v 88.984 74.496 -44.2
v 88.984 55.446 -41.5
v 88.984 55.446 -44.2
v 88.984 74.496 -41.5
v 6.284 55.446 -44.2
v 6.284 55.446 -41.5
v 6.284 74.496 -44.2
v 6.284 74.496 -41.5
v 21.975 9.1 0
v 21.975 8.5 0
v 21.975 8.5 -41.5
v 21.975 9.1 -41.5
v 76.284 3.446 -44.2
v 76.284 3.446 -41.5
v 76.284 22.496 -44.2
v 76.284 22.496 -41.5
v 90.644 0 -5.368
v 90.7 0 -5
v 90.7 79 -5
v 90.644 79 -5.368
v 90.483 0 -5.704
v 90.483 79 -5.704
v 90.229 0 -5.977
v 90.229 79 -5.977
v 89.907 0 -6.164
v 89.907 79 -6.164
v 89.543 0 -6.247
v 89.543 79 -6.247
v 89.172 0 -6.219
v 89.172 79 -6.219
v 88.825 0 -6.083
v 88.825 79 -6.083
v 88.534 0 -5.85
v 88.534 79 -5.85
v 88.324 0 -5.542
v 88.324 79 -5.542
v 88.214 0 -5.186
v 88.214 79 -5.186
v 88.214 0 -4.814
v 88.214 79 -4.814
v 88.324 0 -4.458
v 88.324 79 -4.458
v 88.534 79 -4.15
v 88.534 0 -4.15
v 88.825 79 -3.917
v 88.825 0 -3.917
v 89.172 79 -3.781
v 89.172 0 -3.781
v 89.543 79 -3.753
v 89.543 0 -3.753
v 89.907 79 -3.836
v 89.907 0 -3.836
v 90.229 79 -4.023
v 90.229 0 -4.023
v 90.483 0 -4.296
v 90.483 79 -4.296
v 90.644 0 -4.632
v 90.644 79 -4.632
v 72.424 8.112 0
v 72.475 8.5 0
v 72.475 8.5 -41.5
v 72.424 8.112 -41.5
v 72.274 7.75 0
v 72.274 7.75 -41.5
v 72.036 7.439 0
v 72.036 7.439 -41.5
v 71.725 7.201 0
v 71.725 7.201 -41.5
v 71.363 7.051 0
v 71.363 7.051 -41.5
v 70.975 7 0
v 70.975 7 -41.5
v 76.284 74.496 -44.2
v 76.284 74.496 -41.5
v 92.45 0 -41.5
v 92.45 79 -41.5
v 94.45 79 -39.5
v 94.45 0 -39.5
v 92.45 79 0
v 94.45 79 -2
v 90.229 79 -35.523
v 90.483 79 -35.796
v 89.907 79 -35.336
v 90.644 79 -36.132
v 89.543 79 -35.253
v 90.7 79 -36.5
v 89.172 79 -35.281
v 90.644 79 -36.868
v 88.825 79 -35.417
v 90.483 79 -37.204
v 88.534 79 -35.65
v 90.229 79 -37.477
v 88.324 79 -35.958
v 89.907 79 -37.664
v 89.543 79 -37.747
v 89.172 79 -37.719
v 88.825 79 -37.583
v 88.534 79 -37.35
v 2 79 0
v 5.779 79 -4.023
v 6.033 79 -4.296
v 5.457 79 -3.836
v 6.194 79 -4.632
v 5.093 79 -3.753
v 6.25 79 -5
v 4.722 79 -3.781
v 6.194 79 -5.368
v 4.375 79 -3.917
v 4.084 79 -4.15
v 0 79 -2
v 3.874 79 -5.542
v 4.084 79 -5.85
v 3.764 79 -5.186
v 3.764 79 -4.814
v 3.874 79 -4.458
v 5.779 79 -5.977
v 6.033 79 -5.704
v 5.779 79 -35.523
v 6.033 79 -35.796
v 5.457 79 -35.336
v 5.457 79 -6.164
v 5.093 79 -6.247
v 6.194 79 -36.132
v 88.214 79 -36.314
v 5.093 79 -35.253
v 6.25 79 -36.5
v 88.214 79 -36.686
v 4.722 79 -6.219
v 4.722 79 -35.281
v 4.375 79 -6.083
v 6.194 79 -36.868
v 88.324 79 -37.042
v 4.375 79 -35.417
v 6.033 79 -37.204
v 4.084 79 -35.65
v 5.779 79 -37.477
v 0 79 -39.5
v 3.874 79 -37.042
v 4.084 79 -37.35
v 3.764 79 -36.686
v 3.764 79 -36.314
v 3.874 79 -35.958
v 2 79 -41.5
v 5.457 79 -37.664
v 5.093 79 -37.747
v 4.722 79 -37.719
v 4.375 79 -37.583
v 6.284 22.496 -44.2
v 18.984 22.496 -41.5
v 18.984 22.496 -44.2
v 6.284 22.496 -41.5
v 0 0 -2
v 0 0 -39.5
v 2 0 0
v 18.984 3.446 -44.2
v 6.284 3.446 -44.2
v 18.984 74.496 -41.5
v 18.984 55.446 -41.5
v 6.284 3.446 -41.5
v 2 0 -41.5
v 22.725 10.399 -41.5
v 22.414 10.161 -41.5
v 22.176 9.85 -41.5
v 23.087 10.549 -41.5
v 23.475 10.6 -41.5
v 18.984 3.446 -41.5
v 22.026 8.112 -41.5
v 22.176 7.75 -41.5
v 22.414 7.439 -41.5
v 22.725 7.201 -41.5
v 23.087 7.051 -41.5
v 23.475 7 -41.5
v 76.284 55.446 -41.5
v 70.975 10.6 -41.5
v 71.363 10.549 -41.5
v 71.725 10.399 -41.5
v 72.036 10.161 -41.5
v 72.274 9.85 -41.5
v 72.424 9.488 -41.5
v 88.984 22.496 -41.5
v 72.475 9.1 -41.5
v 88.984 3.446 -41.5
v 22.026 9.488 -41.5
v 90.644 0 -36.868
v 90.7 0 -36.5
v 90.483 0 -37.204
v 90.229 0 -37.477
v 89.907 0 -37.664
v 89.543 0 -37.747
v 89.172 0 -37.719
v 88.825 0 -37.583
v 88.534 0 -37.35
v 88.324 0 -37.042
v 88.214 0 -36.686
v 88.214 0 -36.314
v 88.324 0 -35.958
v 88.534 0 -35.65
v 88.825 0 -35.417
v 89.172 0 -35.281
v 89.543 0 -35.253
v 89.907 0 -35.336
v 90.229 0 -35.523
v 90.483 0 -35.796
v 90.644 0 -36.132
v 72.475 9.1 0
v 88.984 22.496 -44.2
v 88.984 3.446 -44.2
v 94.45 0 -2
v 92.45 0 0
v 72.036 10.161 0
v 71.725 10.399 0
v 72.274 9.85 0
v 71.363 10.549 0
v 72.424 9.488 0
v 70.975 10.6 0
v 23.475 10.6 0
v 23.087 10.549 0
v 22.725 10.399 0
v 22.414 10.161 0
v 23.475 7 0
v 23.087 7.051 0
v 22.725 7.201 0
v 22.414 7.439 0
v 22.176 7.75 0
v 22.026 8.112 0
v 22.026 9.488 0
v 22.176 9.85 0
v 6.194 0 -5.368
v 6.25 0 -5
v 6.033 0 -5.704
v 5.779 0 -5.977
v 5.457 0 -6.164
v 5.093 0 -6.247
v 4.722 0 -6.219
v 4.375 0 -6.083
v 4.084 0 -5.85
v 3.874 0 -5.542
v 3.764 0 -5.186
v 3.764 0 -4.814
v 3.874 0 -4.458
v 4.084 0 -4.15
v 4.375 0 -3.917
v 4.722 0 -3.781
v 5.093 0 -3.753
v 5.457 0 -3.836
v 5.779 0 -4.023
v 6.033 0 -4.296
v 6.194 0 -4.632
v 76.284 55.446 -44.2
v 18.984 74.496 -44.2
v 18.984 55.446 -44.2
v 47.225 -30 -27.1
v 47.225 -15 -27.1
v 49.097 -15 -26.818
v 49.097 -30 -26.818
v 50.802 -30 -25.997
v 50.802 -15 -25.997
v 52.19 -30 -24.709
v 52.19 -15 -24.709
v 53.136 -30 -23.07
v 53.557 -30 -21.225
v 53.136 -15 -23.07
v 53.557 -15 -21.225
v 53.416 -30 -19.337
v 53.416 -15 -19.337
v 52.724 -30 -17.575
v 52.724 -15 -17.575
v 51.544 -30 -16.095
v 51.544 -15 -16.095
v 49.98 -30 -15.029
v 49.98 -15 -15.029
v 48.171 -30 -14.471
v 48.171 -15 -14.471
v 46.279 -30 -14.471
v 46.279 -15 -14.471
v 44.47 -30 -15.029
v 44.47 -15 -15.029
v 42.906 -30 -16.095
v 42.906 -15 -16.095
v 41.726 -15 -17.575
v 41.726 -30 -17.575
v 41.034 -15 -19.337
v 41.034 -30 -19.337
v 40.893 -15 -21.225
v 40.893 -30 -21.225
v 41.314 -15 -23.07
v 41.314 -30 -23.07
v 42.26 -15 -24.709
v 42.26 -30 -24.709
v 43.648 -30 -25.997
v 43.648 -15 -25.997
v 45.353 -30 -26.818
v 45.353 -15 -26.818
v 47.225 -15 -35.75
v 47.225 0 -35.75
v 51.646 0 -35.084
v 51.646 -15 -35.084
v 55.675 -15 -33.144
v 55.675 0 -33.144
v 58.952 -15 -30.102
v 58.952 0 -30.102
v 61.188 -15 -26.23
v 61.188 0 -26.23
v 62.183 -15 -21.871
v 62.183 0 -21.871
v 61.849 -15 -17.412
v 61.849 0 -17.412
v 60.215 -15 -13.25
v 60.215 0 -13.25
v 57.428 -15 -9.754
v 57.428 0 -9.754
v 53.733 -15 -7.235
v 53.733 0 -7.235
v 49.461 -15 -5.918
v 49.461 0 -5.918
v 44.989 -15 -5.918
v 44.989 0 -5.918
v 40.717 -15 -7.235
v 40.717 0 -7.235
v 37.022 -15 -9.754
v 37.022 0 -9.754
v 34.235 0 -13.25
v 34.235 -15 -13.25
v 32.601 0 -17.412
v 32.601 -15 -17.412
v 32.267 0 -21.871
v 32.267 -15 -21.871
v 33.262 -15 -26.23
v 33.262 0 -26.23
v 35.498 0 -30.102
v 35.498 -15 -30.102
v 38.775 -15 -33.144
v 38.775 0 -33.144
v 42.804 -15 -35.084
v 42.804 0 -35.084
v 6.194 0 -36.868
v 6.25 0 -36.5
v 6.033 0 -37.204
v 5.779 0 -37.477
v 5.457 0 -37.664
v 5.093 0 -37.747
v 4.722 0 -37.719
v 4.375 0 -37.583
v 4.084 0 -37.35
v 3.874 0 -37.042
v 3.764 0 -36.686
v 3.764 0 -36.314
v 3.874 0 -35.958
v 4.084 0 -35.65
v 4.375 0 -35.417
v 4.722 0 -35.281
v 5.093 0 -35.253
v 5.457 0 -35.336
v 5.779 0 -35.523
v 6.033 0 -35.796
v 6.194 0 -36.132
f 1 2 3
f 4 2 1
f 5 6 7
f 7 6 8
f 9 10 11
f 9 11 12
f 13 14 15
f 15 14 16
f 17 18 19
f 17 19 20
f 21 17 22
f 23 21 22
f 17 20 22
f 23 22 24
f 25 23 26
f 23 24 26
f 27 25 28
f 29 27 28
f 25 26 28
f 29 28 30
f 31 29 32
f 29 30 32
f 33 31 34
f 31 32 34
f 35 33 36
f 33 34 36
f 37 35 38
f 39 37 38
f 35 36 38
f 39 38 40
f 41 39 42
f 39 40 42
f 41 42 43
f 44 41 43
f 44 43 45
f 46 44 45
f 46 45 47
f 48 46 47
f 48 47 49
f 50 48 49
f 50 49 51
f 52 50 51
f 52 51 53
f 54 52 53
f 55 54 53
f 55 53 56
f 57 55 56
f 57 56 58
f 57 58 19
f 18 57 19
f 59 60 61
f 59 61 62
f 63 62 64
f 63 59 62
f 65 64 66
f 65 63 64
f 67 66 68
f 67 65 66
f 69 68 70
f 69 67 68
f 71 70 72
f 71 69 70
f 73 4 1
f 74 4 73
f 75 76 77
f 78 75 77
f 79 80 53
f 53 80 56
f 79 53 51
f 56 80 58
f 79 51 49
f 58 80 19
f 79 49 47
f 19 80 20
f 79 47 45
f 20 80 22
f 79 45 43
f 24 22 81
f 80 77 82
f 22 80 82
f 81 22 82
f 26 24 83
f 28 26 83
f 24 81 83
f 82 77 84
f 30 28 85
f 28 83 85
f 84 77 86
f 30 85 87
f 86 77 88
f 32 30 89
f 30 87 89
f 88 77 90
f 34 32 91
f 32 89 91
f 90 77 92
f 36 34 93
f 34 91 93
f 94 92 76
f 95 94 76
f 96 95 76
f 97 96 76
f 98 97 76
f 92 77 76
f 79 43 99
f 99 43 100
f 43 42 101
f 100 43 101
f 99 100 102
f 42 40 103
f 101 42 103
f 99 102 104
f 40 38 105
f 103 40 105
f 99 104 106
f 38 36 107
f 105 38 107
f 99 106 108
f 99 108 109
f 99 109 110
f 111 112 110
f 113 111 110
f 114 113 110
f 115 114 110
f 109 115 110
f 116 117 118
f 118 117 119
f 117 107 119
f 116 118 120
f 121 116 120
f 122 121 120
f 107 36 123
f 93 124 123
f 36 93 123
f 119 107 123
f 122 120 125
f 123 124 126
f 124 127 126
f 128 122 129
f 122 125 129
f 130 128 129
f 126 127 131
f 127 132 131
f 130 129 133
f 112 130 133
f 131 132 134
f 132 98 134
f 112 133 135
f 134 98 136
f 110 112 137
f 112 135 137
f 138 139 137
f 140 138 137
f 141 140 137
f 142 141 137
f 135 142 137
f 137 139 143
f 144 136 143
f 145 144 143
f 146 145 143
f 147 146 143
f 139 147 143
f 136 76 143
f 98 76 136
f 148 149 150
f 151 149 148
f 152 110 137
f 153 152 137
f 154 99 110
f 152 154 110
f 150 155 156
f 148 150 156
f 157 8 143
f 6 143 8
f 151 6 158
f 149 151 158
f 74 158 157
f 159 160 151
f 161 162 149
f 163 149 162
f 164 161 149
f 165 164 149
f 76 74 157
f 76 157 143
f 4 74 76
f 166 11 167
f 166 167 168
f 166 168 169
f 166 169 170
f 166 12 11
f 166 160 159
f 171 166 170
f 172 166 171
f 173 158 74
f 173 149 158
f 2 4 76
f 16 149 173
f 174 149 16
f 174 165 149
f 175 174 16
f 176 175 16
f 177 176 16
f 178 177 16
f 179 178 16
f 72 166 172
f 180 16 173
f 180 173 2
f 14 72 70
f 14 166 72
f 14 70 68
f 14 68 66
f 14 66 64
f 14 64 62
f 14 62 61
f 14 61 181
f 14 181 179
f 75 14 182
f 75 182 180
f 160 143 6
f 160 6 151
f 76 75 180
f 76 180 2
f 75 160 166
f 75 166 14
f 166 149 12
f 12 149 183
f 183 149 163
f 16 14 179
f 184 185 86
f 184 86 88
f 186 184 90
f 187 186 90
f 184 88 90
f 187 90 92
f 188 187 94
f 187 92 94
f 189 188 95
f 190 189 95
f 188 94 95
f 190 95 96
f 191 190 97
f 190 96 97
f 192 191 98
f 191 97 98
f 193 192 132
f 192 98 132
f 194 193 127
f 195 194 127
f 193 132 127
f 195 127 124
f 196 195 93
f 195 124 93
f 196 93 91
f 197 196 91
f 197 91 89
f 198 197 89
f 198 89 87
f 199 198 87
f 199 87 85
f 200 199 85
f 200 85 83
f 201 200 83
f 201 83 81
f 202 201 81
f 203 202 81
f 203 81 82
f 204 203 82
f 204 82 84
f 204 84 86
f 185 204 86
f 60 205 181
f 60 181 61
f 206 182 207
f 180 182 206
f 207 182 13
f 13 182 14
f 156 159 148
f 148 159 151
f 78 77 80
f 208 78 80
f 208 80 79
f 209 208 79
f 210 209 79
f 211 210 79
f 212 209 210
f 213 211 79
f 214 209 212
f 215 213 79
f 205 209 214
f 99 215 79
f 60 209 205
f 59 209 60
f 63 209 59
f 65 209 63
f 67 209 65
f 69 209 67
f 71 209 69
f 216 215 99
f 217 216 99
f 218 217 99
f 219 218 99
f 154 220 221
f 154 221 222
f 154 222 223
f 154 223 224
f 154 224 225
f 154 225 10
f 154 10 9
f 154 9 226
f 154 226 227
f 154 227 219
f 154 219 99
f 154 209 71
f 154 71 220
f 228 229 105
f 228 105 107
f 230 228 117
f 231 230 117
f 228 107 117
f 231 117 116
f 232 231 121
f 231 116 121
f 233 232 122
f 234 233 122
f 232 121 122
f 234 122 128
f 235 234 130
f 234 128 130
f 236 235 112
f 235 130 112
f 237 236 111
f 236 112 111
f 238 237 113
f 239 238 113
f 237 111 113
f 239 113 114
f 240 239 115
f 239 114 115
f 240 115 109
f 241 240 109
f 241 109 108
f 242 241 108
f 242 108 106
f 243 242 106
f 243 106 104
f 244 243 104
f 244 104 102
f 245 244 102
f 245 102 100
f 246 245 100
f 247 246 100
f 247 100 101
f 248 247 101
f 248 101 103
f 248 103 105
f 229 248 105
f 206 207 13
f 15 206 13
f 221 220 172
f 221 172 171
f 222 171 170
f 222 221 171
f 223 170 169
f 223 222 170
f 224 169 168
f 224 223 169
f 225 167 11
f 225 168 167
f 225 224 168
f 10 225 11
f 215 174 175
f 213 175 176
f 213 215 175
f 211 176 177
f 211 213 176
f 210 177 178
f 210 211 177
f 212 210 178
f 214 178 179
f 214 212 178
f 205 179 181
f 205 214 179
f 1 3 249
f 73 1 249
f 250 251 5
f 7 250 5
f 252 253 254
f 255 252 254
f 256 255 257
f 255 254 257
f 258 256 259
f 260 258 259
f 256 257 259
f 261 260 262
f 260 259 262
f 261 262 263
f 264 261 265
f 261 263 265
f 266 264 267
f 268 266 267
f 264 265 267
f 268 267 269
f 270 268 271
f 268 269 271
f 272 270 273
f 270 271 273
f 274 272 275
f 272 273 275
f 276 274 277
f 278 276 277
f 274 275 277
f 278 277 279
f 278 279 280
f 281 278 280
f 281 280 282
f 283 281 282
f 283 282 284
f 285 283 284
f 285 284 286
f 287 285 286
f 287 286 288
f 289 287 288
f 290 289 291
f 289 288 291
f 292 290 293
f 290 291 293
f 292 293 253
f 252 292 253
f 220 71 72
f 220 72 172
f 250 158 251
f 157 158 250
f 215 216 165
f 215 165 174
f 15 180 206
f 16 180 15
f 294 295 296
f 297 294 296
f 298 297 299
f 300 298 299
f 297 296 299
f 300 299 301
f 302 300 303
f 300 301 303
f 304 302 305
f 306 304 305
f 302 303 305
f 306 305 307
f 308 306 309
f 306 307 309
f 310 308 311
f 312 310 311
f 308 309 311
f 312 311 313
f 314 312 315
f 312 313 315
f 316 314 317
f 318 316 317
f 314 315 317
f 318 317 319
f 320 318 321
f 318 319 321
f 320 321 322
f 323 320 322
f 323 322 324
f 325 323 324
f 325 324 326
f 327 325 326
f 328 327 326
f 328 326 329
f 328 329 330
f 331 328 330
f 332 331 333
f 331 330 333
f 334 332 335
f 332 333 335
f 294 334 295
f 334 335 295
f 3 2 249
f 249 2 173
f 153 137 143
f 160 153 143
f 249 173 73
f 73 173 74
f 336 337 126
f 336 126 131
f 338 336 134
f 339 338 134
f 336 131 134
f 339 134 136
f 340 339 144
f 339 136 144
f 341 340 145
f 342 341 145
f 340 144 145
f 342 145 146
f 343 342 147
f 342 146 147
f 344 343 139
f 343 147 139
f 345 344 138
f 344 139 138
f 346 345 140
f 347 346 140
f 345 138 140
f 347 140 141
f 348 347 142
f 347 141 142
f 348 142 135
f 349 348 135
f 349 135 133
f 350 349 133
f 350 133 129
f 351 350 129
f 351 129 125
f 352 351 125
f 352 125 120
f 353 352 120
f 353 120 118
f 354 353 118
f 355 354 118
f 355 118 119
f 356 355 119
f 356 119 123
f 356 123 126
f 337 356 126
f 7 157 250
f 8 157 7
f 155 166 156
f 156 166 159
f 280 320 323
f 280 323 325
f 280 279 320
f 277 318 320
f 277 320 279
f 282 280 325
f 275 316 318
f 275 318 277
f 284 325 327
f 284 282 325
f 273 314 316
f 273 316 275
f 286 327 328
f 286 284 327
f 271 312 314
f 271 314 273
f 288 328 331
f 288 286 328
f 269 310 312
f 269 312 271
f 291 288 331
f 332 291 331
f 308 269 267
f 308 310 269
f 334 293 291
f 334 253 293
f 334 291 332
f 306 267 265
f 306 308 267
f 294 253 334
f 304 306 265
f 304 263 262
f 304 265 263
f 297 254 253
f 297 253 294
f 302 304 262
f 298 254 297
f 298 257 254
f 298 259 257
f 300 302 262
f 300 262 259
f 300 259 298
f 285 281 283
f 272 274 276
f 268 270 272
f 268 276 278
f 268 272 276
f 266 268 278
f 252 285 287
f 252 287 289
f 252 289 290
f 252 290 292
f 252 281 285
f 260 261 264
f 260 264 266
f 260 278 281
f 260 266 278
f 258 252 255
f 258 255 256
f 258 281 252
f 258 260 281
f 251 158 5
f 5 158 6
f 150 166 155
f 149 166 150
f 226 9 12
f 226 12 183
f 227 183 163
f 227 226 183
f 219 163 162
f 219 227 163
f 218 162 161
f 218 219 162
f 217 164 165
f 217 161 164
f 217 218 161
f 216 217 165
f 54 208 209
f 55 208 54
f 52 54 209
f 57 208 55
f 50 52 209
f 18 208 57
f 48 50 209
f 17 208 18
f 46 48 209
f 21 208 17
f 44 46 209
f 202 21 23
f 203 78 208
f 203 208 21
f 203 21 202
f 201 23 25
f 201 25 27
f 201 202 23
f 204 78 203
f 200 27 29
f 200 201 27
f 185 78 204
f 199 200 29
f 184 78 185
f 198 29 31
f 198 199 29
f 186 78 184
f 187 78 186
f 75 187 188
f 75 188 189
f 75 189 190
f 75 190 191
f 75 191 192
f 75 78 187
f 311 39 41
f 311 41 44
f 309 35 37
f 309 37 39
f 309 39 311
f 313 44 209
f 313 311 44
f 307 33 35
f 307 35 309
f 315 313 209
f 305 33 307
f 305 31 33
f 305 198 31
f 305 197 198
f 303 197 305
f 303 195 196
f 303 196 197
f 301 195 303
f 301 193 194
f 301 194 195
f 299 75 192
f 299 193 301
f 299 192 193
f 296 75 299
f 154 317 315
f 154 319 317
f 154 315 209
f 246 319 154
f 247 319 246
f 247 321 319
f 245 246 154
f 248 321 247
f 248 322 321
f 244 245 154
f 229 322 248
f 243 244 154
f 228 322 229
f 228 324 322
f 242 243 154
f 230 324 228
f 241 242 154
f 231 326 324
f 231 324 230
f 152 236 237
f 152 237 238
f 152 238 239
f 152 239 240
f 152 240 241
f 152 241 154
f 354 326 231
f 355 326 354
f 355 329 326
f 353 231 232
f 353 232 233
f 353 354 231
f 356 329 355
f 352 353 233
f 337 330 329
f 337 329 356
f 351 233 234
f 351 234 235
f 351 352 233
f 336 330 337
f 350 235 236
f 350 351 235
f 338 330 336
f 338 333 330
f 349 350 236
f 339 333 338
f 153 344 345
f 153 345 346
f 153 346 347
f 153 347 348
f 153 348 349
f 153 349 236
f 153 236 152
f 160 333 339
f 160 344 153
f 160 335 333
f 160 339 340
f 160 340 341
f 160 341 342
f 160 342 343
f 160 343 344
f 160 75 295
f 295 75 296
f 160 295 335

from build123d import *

# Parameters (mm, degrees)
BOSS_EXTRUDE1_DEPTH         = 79
SKETCH2_W                   = 12.7
SKETCH2_H                   = 19.05
BOSS_EXTRUDE2_DEPTH         = 2.7
LPATTERN1_COUNT             = 2
LPATTERN1_PITCH             = 70
LPATTERN1_COUNT_DIR2        = 2
LPATTERN1_PITCH_DIR2        = 52
SKETCH3_R                   = 15
BOSS_EXTRUDE3_DEPTH         = 15
SKETCH4_R                   = 6.35
BOSS_EXTRUDE4_DEPTH         = 15
CUT_EXTRUDE1_DEPTH          = 131.826000856
TAP_DRILL_FOR_M3X0_5_TAP1_D = 2.5


with BuildPart() as part:
    # Sketch1 → Boss-Extrude1 (new body)
    with BuildSketch(Plane(origin=(0, 0, 0), x_dir=(1, 0, 0), z_dir=(0, 1, 0))):
        Polygon((0, 39.5), (2, 41.5), (92.45, 41.5), (94.45, 39.5), (94.45, 2), (92.45, 0), (2, 0), (0, 2), align=None)
    extrude(amount=BOSS_EXTRUDE1_DEPTH)

    # Sketch2 → Boss-Extrude2 (add)
    with BuildSketch(Plane(origin=(0, 0, -41.5), x_dir=(-1, 0, 0), z_dir=(0, 0, -1))):
        with Locations((-12.634045562, 12.971461945)):
            Rectangle(SKETCH2_W, SKETCH2_H)
    boss_extrude2 = extrude(amount=BOSS_EXTRUDE2_DEPTH)

    # LPattern1: Boss-Extrude2 2 × 2
    with Locations(*[(i * LPATTERN1_PITCH, j * LPATTERN1_PITCH_DIR2, 0) for i in range(LPATTERN1_COUNT) for j in range(LPATTERN1_COUNT_DIR2) if (i, j) != (0, 0)]):
        add(boss_extrude2)

    # Sketch3 → Boss-Extrude3 (add)
    with BuildSketch(Plane.XZ):
        with Locations(Location((47.225, -20.75, 0), (0, 0, 270))):
            Circle(SKETCH3_R)
    extrude(amount=BOSS_EXTRUDE3_DEPTH)

    # Sketch4 → Boss-Extrude4 (add)
    with BuildSketch(Plane.XZ.offset(15)):
        with Locations(Location((47.225, -20.75, 0), (0, 0, 270))):
            Circle(SKETCH4_R)
    extrude(amount=BOSS_EXTRUDE4_DEPTH)

    # Sketch5 → Cut-Extrude1 (cut, through all)
    with BuildSketch(Plane.XY):
        with BuildLine():
            Line((70.975, 7), (23.475, 7))
            ThreePointArc((23.475, 7), (22.414339828, 7.439339828), (21.975, 8.5))
            Line((21.975, 8.5), (21.975, 9.1))
            ThreePointArc((21.975, 9.1), (22.414339828, 10.160660172), (23.475, 10.6))
            Line((23.475, 10.6), (70.975, 10.6))
            ThreePointArc((70.975, 10.6), (72.035660172, 10.160660172), (72.475, 9.1))
            Line((72.475, 9.1), (72.475, 8.5))
            ThreePointArc((72.475, 8.5), (72.035660172, 7.439339828), (70.975, 7))
        make_face()
    extrude(amount=-CUT_EXTRUDE1_DEPTH, mode=Mode.SUBTRACT)

    # Tap Drill for M3x0.5 Tap1 (through all)
    with Locations(Plane(origin=(0, 0, 0), x_dir=(-1, 0, 0), z_dir=(0, -1, 0))):
        with Locations((-5, 5), (-5, 36.5), (-89.45, 36.5), (-89.45, 5)):
            Hole(TAP_DRILL_FOR_M3X0_5_TAP1_D / 2)


solid = part.part
